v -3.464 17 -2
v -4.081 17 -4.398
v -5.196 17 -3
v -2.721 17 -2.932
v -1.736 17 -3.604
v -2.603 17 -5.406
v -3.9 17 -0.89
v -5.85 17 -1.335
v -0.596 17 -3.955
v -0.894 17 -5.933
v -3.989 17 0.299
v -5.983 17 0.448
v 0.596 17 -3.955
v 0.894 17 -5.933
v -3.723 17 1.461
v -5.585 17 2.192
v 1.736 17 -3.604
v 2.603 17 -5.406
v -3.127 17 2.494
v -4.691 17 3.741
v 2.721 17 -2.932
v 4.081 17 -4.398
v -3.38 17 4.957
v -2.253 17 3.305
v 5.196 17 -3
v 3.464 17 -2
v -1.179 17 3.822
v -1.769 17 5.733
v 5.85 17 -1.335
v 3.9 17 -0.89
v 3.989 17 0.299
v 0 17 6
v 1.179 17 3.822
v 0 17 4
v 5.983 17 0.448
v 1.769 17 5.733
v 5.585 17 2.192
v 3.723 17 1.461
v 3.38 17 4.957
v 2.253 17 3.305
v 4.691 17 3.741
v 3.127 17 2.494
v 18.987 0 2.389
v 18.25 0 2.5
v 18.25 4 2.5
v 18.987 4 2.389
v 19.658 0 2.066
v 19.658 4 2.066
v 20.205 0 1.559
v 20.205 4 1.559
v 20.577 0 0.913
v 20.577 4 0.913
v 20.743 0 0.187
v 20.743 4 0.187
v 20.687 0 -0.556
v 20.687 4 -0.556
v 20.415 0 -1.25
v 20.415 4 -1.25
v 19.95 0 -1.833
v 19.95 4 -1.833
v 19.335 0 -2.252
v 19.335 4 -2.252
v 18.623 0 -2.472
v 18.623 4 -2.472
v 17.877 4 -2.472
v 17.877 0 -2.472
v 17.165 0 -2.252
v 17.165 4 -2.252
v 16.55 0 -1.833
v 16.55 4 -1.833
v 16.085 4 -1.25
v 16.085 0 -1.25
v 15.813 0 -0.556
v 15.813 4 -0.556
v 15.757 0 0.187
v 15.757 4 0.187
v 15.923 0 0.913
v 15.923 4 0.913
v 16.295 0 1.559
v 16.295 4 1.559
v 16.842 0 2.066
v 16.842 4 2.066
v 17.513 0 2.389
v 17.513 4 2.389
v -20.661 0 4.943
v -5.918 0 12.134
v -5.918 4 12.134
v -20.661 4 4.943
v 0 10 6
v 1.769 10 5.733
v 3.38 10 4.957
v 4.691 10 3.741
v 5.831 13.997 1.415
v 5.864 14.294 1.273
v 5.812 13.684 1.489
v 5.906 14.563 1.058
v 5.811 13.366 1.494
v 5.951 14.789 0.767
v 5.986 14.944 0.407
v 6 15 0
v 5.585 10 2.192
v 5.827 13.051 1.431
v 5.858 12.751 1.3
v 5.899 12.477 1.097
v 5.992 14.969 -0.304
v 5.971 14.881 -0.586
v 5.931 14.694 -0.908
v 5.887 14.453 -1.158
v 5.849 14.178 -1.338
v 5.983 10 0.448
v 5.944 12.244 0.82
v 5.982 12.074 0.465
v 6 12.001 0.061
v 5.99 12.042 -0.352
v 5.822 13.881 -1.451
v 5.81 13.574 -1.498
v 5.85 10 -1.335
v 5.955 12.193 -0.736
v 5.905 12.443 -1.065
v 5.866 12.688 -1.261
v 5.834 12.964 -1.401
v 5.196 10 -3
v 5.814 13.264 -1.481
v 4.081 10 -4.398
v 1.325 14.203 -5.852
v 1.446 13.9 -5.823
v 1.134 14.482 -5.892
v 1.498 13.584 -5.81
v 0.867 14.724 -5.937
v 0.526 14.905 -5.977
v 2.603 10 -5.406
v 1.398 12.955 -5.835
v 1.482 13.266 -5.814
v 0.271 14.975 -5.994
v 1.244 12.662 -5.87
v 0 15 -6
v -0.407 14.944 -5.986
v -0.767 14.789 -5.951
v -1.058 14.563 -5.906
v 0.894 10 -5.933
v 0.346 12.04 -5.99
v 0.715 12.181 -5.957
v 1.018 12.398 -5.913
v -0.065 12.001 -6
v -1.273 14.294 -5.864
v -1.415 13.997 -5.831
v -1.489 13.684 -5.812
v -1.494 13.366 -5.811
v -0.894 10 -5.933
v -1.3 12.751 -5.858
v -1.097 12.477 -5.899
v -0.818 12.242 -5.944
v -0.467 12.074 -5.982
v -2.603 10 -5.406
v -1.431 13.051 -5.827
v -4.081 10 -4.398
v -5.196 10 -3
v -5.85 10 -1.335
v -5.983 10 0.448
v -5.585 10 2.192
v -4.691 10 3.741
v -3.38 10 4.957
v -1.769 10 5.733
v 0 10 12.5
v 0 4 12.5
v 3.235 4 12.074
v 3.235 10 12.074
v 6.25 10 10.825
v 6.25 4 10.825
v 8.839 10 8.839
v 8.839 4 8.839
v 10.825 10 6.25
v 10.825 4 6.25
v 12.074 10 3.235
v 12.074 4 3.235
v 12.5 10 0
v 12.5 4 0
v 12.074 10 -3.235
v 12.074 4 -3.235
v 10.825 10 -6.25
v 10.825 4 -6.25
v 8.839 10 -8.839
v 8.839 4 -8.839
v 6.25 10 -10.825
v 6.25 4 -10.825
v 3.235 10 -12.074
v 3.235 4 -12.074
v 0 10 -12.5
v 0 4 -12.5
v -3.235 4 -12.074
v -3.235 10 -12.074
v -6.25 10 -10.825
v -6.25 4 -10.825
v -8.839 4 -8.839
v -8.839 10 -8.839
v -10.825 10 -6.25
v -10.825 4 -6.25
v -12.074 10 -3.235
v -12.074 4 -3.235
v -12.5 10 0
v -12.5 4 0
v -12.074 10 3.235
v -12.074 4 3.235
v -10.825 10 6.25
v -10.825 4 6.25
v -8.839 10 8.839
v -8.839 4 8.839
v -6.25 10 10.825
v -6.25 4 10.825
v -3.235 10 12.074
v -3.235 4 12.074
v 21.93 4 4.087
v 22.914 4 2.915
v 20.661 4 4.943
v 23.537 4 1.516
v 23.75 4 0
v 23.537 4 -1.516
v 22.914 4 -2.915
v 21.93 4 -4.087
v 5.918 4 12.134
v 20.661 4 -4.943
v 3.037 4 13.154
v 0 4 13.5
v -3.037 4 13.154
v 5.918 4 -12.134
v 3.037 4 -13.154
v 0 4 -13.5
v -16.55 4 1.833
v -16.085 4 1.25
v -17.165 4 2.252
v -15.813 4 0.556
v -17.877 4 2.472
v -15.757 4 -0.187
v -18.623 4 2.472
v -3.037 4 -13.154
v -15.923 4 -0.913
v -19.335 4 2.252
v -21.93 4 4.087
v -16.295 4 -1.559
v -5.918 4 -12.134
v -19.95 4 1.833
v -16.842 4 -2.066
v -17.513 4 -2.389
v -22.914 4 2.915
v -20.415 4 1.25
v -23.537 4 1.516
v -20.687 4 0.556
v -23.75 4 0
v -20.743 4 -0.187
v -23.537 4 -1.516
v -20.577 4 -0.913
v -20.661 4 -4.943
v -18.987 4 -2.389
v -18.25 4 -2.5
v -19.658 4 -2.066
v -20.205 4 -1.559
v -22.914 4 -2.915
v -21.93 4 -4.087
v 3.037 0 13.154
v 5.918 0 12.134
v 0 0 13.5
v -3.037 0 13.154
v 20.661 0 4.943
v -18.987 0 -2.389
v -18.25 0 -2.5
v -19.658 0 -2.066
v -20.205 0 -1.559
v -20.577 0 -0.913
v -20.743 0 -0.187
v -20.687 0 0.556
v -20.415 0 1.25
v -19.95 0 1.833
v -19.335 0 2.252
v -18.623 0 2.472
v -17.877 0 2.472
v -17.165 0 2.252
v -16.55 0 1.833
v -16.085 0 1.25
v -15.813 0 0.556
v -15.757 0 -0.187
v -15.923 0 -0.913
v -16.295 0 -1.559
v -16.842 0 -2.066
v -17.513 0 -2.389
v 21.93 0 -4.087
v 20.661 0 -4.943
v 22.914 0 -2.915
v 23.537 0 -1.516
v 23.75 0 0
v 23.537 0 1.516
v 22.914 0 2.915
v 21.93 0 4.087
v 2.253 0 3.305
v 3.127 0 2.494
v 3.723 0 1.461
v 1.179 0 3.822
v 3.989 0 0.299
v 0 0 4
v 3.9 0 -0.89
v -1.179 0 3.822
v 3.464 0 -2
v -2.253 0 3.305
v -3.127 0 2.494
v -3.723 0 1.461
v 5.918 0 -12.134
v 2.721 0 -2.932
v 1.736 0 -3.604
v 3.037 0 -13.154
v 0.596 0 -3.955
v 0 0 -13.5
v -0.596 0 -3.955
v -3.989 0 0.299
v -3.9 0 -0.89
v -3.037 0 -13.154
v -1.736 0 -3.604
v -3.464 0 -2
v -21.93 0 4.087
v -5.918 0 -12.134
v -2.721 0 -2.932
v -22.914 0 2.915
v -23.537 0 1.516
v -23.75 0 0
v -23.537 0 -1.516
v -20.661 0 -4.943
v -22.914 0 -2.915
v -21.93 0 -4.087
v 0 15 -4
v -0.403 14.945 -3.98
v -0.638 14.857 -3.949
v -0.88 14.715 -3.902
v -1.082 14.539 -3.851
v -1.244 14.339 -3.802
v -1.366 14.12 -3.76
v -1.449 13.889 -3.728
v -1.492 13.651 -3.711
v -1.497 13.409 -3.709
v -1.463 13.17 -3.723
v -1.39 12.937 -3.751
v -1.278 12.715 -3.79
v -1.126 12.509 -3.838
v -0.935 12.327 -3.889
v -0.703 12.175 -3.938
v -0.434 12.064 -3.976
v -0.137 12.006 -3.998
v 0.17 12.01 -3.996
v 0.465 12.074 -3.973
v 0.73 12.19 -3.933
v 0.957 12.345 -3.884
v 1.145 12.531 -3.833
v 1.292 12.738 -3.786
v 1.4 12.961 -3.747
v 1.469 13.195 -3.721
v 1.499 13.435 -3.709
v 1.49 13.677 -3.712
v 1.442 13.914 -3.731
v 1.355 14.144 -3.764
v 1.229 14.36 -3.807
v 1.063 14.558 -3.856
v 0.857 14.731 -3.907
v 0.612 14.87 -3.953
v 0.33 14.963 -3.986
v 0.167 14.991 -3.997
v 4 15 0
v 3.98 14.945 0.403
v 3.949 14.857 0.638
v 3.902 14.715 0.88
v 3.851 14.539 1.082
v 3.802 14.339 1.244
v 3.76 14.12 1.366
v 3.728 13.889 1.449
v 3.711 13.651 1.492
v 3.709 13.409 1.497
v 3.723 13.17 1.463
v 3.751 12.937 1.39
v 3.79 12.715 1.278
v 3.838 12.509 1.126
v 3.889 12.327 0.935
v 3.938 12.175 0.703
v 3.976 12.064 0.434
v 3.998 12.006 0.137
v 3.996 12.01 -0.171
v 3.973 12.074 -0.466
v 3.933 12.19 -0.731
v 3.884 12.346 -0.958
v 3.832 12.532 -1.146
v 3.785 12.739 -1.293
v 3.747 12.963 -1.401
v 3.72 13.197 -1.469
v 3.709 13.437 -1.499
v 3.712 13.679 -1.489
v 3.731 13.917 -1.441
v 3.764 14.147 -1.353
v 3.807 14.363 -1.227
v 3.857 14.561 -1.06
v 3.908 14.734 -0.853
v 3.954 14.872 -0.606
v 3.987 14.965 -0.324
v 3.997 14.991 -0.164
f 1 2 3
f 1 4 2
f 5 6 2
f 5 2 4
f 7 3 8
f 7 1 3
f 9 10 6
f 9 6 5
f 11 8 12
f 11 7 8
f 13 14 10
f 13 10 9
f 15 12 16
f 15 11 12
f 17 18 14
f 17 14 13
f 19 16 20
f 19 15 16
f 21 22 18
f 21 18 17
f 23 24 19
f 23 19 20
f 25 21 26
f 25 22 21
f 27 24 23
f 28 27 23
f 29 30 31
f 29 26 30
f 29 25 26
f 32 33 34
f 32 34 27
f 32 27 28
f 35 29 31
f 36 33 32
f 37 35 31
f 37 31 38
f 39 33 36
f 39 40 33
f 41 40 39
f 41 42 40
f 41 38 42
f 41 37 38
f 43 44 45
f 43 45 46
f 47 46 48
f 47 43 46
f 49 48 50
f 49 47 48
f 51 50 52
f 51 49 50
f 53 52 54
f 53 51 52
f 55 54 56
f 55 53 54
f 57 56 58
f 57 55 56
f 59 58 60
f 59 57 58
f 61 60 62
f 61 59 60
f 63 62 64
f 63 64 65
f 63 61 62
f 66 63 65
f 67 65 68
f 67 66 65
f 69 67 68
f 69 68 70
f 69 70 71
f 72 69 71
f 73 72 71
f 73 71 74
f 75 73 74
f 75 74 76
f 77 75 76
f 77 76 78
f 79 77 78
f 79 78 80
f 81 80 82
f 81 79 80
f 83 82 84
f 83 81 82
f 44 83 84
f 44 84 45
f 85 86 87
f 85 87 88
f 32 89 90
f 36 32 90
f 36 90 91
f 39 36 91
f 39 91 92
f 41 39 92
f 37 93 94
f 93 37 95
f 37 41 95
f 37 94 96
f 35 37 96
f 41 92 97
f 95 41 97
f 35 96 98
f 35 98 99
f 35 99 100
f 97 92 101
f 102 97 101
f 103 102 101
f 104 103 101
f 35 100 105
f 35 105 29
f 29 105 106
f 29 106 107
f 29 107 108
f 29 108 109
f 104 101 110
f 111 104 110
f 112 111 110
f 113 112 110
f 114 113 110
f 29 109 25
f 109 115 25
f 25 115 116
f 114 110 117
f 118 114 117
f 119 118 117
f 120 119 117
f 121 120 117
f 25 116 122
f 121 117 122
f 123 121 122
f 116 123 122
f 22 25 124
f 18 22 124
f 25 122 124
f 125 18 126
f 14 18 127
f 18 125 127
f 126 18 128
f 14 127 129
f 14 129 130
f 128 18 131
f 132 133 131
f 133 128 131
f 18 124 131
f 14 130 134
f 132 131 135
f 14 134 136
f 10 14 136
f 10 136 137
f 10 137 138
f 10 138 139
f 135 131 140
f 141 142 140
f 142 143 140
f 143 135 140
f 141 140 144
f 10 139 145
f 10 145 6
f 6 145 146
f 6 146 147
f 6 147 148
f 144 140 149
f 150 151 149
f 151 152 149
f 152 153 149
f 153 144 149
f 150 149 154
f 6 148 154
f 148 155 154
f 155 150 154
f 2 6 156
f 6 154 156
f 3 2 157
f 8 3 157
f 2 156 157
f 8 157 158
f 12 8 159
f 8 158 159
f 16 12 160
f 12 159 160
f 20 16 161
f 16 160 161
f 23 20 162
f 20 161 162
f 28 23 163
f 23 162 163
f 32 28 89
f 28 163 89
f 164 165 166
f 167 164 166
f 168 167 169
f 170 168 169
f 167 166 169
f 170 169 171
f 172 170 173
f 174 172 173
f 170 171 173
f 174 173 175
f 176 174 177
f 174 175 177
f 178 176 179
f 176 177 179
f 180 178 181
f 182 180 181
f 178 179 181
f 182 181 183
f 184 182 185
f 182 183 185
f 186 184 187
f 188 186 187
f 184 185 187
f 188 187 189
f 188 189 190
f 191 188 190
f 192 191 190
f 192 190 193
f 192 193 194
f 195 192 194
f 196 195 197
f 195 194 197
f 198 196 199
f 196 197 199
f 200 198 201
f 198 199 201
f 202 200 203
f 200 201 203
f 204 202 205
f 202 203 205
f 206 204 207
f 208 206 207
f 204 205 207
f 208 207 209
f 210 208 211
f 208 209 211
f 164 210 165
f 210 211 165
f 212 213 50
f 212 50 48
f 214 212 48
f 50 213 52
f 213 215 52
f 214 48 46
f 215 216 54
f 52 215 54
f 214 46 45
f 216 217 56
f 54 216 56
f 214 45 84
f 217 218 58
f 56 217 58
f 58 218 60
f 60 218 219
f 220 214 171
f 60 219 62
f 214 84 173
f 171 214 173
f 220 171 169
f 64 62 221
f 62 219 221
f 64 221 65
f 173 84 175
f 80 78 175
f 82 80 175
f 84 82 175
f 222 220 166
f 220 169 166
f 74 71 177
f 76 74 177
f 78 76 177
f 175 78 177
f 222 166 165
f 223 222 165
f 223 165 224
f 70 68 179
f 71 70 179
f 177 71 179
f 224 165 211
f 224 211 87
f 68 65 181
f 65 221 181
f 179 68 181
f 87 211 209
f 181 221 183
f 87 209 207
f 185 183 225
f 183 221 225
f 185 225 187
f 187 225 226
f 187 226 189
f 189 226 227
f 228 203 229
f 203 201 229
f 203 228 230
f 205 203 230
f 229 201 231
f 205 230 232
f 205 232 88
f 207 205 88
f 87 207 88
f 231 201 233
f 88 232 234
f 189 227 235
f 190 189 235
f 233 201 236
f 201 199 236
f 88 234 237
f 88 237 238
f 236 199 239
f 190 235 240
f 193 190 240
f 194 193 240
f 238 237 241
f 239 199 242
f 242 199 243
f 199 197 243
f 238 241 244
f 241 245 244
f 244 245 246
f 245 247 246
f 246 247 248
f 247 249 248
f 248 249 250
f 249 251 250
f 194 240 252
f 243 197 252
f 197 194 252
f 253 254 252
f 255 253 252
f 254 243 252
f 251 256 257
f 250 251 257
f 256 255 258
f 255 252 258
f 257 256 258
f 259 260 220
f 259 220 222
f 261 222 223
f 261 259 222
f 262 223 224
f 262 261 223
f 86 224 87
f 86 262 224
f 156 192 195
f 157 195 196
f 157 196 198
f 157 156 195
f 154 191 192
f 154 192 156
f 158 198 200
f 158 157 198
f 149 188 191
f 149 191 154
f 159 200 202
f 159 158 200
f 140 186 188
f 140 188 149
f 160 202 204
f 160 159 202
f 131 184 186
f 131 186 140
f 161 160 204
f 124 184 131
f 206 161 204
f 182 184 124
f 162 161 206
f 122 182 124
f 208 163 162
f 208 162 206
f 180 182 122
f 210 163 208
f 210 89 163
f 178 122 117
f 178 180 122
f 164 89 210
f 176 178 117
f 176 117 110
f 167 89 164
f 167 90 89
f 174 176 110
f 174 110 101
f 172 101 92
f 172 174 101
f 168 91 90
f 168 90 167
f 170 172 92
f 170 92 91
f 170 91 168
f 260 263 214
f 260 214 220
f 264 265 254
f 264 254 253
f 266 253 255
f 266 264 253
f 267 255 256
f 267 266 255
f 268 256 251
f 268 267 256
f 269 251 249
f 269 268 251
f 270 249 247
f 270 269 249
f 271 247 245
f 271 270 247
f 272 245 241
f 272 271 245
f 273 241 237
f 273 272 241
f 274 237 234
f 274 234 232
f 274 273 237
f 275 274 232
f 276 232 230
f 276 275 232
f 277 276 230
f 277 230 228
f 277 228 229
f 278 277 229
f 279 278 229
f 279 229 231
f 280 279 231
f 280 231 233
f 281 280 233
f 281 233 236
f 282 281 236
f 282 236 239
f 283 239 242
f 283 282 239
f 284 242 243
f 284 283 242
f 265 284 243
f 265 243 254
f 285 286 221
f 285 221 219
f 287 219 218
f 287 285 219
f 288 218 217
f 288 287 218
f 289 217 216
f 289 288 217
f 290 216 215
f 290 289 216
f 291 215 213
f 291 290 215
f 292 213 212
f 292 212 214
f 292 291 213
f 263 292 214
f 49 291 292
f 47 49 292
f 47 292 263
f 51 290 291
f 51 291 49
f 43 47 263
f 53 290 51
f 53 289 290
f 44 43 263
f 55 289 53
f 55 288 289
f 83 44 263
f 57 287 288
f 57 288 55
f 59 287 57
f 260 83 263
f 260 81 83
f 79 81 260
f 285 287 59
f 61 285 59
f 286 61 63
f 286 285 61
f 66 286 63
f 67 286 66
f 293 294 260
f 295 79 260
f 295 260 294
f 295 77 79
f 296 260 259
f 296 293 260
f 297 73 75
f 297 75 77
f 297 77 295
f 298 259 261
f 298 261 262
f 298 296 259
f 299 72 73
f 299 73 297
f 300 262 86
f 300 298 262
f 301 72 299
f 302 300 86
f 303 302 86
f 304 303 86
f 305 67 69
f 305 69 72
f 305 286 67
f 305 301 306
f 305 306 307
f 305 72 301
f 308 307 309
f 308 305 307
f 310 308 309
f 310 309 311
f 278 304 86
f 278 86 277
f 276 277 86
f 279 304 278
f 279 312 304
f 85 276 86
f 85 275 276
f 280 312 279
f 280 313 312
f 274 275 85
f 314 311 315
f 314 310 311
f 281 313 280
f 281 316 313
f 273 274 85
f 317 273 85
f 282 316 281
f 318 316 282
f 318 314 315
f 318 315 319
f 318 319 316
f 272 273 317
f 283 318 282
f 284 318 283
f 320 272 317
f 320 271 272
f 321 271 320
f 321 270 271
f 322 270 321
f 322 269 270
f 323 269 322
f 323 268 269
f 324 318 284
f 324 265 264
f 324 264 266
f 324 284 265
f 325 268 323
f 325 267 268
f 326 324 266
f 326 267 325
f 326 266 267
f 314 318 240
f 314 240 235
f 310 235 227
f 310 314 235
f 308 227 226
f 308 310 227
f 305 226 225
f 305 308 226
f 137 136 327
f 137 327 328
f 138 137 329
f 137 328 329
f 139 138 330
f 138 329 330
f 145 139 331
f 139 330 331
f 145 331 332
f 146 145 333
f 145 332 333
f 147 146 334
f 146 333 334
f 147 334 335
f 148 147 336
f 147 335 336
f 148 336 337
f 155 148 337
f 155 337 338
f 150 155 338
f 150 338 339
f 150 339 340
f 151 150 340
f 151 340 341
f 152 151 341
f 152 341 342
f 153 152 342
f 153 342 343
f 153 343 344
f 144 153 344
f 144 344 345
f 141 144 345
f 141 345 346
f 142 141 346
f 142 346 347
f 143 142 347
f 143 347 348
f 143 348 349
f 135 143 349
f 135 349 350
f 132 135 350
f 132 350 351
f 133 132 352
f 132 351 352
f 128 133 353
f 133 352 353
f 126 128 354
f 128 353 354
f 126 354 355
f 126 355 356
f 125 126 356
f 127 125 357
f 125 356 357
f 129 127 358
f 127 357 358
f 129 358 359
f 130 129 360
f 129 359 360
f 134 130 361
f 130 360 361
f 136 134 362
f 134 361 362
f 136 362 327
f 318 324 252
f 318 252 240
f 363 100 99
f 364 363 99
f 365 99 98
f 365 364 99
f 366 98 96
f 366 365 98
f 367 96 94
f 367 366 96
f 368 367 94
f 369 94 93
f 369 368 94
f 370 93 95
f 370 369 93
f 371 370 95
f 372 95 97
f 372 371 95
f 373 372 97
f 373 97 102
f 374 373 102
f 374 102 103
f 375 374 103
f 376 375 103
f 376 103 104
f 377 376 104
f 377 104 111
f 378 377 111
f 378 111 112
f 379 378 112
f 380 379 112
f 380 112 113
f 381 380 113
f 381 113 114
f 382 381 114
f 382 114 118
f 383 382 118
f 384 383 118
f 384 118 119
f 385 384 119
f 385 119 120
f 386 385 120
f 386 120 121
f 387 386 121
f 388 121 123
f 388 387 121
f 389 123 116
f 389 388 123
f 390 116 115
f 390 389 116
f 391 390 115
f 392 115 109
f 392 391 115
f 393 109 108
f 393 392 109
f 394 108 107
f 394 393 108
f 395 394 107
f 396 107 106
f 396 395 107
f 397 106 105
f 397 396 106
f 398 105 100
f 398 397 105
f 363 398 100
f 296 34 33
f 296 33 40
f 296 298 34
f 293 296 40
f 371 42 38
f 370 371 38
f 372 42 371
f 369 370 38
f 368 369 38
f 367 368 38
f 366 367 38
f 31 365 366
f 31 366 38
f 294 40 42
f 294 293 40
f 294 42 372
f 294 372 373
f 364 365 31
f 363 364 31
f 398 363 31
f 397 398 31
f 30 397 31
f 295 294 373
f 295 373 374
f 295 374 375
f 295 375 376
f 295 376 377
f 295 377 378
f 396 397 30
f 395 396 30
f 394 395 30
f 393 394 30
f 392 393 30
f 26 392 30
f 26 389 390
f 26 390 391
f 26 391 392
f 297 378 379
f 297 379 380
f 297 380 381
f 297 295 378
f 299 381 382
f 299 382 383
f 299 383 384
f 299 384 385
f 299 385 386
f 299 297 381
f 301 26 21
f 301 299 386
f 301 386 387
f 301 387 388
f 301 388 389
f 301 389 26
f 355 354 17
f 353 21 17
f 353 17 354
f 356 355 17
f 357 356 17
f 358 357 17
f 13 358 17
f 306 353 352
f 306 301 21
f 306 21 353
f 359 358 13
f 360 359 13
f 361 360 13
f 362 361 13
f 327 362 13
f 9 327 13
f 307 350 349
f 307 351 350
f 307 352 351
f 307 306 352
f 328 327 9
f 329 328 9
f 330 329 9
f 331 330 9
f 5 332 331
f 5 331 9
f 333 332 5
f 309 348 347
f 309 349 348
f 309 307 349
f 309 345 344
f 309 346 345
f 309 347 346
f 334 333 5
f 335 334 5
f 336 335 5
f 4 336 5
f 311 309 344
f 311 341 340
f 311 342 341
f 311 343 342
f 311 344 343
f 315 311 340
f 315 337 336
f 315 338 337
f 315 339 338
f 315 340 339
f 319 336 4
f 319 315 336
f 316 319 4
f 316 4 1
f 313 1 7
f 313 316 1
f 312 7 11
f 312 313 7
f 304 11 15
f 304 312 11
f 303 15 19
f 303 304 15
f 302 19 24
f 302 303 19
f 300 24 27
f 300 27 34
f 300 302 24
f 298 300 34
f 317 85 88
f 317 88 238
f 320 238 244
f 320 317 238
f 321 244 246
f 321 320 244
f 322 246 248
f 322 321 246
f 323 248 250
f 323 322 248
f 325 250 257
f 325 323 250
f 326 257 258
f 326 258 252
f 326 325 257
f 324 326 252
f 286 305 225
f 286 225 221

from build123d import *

# Parameters (mm, degrees)
SKETCH1_R           = 2.5
SKETCH1_R_2         = 4
BOSS_EXTRUDE1_DEPTH = 4
SKETCH2_R           = 12.5
SKETCH2_R_2         = 4
BOSS_EXTRUDE2_DEPTH = 6
SKETCH3_R           = 6
SKETCH3_R_2         = 4
BOSS_EXTRUDE3_DEPTH = 7
SKETCH4_R           = 1.5
CUT_EXTRUDE1_DEPTH  = 33.176272314


with BuildPart() as part:
    # Sketch1 → Boss-Extrude1 (new body)
    with BuildSketch(Plane(origin=(0, 0, 0), x_dir=(1, 0, 0), z_dir=(0, 1, 0))):
        with BuildLine():
            Line((-20.660958904, 4.943407445), (-5.917808219, 12.133818273))
            ThreePointArc((-5.917808219, 12.133818273), (0, 13.5), (5.917808219, 12.133818273))
            Line((5.917808219, 12.133818273), (20.660958904, 4.943407445))
            ThreePointArc((20.660958904, 4.943407445), (23.75, 0), (20.660958904, -4.943407445))
            Line((20.660958904, -4.943407445), (5.917808219, -12.133818273))
            ThreePointArc((5.917808219, -12.133818273), (0, -13.5), (-5.917808219, -12.133818273))
            Line((-5.917808219, -12.133818273), (-20.660958904, -4.943407445))
            ThreePointArc((-20.660958904, -4.943407445), (-23.75, 0), (-20.660958904, 4.943407445))
        make_face()
        with Locations(Location((18.25, 0, 0), (0, 0, 270))):
            Circle(SKETCH1_R, mode=Mode.SUBTRACT)
        with Locations(Location((-18.25, 0, 0), (0, 0, 90))):
            Circle(SKETCH1_R, mode=Mode.SUBTRACT)
        with Locations(Location((0, 0, 0), (0, 0, 270))):
            Circle(SKETCH1_R_2, mode=Mode.SUBTRACT)
    extrude(amount=BOSS_EXTRUDE1_DEPTH)

    # Sketch2 → Boss-Extrude2 (add)
    with BuildSketch(Plane(origin=(0, 4, 0), x_dir=(1, 0, 0), z_dir=(0, 1, 0))):
        with Locations(Location((0, 0, 0), (0, 0, 270))):
            Circle(SKETCH2_R)
        with Locations(Location((0, 0, 0), (0, 0, 270))):
            Circle(SKETCH2_R_2, mode=Mode.SUBTRACT)
    extrude(amount=BOSS_EXTRUDE2_DEPTH)

    # Sketch3 → Boss-Extrude3 (add)
    with BuildSketch(Plane(origin=(0, 10, 0), x_dir=(1, 0, 0), z_dir=(0, 1, 0))):
        with Locations(Location((0, 0, 0), (0, 0, 270))):
            Circle(SKETCH3_R)
        with Locations(Location((0, 0, 0), (0, 0, 270))):
            Circle(SKETCH3_R_2, mode=Mode.SUBTRACT)
    extrude(amount=BOSS_EXTRUDE3_DEPTH)

    # Sketch4 → Cut-Extrude1 (cut, through all)
    with BuildSketch(Plane.XY):
        with Locations(Location((0, 13.5, 0), (0, 0, 90))):
            Circle(SKETCH4_R)
    cut_extrude1 = extrude(amount=-CUT_EXTRUDE1_DEPTH, mode=Mode.SUBTRACT)

    # Mirror1: Cut-Extrude1 across plane
    add(cut_extrude1.mirror(Plane(origin=(0, 0, 0), x_dir=(-0.7071067811865478, 0, 0.7071067811865472), z_dir=(0.7071067811865475, 0, 0.7071067811865477))), mode=Mode.SUBTRACT)


solid = part.part
